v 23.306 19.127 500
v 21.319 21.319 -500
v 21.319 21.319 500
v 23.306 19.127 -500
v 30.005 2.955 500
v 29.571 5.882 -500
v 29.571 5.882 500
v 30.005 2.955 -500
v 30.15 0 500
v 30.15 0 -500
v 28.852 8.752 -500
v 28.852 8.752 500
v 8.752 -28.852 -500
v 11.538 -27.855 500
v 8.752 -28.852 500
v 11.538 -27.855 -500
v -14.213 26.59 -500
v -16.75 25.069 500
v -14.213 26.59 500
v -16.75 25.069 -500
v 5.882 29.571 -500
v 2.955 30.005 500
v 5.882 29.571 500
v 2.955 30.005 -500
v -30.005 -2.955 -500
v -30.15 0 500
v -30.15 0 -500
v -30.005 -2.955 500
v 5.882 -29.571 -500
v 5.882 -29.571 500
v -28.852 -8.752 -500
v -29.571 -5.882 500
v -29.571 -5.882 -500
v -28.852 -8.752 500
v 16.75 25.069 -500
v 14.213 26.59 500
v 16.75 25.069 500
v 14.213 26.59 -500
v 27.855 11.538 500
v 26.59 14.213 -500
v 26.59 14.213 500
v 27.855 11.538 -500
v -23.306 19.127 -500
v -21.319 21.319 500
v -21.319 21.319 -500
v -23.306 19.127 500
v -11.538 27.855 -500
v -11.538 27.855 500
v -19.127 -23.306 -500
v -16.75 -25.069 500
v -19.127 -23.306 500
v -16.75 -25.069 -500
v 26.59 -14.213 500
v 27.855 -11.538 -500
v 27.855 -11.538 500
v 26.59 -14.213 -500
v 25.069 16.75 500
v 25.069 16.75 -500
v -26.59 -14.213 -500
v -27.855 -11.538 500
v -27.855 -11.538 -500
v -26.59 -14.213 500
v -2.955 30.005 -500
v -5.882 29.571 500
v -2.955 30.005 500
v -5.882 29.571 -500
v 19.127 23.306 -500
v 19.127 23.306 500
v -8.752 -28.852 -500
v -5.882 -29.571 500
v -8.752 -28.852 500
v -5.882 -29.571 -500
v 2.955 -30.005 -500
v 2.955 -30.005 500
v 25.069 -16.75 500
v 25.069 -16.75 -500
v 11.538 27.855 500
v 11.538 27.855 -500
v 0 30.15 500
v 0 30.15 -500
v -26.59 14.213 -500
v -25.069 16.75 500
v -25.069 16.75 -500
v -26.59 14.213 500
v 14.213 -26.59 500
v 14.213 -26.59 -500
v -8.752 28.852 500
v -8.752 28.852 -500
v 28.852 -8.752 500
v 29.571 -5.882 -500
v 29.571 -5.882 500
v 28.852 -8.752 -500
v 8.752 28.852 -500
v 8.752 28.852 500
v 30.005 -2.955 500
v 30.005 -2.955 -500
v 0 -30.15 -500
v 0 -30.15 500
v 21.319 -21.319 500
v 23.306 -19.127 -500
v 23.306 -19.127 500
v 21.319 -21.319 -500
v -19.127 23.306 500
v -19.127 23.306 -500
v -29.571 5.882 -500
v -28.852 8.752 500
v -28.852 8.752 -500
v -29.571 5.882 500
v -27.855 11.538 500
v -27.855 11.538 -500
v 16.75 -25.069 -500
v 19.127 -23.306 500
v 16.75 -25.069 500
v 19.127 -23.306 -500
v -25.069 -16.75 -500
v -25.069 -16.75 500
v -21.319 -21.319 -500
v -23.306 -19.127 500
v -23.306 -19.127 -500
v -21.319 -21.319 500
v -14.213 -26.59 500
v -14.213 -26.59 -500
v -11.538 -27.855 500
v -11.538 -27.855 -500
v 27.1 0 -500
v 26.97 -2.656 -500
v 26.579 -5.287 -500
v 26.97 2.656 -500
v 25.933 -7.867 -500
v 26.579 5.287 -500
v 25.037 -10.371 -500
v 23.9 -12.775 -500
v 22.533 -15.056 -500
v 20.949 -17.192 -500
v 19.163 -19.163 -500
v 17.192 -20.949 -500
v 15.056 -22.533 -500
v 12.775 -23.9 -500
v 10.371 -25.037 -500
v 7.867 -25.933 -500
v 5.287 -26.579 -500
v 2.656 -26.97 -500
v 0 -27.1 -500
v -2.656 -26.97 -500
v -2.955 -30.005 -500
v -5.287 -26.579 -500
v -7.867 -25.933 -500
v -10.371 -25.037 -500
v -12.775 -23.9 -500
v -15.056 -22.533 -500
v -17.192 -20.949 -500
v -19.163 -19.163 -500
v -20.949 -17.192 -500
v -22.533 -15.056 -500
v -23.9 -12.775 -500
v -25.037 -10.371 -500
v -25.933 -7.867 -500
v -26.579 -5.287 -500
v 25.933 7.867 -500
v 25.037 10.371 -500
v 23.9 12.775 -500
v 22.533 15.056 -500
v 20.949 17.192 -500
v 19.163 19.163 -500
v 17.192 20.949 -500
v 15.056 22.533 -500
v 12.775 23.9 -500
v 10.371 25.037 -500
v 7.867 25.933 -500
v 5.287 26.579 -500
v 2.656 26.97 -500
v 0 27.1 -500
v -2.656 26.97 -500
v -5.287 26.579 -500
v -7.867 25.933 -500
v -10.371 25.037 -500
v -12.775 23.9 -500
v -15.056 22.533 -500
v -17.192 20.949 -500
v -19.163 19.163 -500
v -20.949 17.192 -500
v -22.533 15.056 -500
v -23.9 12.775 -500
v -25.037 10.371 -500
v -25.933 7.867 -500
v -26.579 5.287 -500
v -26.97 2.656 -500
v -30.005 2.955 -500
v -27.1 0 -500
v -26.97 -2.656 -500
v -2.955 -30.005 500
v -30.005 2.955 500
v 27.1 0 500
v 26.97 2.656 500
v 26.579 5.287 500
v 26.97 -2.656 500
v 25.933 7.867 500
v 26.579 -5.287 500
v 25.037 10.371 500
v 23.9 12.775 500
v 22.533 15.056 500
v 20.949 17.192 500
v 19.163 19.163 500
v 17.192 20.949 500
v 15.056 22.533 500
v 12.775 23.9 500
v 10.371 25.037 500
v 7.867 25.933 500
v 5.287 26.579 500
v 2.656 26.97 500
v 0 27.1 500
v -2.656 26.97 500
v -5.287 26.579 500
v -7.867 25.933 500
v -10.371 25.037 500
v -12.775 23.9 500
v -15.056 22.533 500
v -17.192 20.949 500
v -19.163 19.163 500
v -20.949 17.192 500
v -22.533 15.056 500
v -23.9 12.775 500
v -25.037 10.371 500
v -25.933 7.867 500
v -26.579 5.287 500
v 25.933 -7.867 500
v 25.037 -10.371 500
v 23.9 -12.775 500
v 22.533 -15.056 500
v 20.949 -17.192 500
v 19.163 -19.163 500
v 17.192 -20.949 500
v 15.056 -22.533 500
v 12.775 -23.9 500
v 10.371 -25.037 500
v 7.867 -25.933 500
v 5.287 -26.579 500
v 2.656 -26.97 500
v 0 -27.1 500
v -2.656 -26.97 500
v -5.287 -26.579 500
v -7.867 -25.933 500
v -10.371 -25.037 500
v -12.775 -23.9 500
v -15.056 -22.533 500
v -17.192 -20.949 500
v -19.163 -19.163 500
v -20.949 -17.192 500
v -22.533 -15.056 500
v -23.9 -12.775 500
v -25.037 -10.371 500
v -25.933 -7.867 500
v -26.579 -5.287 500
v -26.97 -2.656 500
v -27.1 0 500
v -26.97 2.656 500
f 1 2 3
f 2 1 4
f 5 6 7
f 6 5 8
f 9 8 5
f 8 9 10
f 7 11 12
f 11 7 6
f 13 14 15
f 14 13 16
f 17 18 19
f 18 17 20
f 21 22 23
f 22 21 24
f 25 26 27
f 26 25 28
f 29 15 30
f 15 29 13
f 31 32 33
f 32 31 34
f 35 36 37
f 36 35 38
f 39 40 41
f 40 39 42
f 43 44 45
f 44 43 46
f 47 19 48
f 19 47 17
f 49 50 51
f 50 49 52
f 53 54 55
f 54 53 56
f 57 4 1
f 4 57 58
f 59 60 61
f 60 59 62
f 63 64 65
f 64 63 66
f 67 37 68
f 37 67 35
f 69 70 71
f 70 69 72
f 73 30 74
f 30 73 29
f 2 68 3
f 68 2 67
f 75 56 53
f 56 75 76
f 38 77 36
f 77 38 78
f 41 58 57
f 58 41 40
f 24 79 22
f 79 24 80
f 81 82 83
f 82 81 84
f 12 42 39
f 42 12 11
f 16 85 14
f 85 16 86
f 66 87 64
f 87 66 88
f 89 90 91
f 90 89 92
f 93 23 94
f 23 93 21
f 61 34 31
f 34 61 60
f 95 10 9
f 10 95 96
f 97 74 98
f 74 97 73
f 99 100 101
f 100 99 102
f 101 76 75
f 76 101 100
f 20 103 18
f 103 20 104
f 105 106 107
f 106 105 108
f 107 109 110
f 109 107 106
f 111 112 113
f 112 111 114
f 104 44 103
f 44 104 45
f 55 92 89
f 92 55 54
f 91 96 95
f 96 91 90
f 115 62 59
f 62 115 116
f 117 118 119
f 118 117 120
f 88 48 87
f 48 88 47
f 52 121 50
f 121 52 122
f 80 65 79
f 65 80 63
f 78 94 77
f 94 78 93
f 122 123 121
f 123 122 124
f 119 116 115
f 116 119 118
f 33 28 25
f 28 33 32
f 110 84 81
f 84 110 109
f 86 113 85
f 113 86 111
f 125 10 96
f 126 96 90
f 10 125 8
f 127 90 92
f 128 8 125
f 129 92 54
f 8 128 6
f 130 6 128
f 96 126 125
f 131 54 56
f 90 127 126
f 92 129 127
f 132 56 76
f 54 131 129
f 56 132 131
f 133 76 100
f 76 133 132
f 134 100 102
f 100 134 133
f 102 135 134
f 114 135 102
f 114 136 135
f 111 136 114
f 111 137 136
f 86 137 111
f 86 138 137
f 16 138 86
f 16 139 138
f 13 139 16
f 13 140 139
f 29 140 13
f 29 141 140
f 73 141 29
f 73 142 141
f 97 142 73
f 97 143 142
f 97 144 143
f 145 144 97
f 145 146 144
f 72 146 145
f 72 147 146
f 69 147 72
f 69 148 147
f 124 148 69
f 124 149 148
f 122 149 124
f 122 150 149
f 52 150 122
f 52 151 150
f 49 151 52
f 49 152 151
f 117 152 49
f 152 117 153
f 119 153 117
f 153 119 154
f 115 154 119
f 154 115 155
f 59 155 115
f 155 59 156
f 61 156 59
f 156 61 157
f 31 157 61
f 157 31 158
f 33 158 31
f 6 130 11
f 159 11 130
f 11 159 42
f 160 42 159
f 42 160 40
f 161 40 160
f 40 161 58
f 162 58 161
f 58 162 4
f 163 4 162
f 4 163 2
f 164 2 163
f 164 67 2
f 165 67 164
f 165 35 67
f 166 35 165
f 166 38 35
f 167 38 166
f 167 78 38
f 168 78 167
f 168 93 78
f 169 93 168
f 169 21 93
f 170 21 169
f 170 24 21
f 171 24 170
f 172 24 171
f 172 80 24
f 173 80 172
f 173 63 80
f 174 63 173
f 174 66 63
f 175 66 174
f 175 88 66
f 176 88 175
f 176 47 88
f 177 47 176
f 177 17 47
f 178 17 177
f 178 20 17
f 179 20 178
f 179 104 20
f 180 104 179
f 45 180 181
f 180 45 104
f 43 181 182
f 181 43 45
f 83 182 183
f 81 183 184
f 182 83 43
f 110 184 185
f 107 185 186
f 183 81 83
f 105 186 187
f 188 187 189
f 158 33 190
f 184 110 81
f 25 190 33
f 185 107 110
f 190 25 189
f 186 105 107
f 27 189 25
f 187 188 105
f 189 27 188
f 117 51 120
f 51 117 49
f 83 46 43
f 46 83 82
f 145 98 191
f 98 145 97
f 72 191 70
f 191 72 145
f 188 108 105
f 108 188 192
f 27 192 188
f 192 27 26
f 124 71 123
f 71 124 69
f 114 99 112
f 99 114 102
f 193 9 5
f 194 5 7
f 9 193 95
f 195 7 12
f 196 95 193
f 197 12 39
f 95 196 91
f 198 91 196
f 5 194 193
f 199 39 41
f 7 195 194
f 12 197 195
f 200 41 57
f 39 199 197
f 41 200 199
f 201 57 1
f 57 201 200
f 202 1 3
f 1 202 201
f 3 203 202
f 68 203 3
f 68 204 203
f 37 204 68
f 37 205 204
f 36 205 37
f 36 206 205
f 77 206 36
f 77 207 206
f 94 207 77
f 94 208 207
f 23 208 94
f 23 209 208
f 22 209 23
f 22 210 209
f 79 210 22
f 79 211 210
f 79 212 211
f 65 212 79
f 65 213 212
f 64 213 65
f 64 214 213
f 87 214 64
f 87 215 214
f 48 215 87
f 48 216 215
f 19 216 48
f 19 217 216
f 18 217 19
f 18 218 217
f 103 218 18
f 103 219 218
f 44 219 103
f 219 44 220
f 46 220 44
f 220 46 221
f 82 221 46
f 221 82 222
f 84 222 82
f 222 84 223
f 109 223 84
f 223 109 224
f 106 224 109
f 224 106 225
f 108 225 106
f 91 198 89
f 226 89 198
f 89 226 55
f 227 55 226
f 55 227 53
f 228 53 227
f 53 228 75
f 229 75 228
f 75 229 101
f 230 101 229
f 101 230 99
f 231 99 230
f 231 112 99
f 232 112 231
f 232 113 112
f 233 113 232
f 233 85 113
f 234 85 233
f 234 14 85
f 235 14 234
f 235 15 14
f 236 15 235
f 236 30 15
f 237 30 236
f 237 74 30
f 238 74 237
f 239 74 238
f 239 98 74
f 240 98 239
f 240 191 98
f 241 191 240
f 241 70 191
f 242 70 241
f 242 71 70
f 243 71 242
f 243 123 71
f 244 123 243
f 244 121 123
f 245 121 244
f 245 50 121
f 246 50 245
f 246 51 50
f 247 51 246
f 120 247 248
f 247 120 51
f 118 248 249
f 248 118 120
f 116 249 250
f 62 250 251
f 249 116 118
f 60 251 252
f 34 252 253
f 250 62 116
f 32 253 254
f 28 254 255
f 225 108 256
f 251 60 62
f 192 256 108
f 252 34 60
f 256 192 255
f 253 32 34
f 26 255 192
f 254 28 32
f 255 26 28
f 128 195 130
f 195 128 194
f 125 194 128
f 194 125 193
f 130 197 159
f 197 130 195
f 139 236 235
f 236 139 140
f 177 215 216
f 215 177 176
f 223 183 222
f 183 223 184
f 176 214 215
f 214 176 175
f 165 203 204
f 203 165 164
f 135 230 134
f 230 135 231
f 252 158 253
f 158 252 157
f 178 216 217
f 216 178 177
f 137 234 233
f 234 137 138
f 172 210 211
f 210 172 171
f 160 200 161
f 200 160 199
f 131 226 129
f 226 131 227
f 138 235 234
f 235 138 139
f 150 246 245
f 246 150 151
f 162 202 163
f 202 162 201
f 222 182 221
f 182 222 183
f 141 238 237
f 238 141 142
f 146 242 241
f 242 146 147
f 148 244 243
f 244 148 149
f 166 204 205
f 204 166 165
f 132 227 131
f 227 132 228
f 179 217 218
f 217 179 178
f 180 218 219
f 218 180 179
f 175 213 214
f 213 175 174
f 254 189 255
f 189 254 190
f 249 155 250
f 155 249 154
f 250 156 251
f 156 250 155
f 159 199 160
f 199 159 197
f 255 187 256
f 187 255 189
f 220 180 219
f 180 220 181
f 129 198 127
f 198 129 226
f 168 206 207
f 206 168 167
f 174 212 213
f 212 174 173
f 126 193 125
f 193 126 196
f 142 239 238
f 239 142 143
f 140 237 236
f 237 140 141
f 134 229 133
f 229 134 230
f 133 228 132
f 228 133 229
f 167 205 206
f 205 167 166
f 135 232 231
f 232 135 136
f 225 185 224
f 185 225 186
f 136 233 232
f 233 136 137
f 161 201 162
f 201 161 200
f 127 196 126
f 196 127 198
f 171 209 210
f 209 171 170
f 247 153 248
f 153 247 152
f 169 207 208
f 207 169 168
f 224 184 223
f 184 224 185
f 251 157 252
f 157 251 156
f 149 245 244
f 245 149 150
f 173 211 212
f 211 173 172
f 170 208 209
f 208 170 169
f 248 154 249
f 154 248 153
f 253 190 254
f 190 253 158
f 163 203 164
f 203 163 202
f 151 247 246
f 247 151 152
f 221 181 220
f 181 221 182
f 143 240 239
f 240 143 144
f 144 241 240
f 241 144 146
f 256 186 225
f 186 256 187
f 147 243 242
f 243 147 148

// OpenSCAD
// Steel pipe — SCH10 / SCH40 / CPVC / copper.
//
// Params:
//   size_in      nominal pipe size in inches (1, 1.25, 1.5, 2, 2.5, 3, 4, 5, 6, 8, 10)
//   length_m     length of this cut piece in meters (default 1.0 m)
//   schedule     "sch10" | "sch40" (affects wall thickness)
//
// Output: origin at center, long axis = +Z, both ends open.
//
// Local convention matches connectorsFor(): end_a at -Z/2, end_b at +Z/2.

size_in   = 2;
length_m  = 1.0;
schedule  = "sch10";

// NPS → approximate outer diameter (mm) per ASME B36.10
function od_mm(nps) =
    nps ==   1  ? 33.4 :
    nps == 1.25 ? 42.2 :
    nps == 1.5  ? 48.3 :
    nps ==   2  ? 60.3 :
    nps == 2.5  ? 73.0 :
    nps ==   3  ? 88.9 :
    nps ==   4  ? 114.3 :
    nps ==   5  ? 141.3 :
    nps ==   6  ? 168.3 :
    nps ==   8  ? 219.1 :
    nps ==  10  ? 273.0 : 60.3;

// Wall thickness (mm) — schedule-dependent
function wall_mm(nps, sched) =
    sched == "sch40"
        ? (nps <= 1.5 ? 3.68 : nps <= 3 ? 5.49 : 6.02)
        : (nps <= 1.5 ? 2.77 : nps <= 3 ? 3.05 : 3.68);

od = od_mm(size_in);
id = od - 2 * wall_mm(size_in, schedule);
len_mm = length_m * 1000;

difference() {
    cylinder(h = len_mm, d = od, center = true, $fn = 64);
    cylinder(h = len_mm + 1, d = id, center = true, $fn = 64);
}
